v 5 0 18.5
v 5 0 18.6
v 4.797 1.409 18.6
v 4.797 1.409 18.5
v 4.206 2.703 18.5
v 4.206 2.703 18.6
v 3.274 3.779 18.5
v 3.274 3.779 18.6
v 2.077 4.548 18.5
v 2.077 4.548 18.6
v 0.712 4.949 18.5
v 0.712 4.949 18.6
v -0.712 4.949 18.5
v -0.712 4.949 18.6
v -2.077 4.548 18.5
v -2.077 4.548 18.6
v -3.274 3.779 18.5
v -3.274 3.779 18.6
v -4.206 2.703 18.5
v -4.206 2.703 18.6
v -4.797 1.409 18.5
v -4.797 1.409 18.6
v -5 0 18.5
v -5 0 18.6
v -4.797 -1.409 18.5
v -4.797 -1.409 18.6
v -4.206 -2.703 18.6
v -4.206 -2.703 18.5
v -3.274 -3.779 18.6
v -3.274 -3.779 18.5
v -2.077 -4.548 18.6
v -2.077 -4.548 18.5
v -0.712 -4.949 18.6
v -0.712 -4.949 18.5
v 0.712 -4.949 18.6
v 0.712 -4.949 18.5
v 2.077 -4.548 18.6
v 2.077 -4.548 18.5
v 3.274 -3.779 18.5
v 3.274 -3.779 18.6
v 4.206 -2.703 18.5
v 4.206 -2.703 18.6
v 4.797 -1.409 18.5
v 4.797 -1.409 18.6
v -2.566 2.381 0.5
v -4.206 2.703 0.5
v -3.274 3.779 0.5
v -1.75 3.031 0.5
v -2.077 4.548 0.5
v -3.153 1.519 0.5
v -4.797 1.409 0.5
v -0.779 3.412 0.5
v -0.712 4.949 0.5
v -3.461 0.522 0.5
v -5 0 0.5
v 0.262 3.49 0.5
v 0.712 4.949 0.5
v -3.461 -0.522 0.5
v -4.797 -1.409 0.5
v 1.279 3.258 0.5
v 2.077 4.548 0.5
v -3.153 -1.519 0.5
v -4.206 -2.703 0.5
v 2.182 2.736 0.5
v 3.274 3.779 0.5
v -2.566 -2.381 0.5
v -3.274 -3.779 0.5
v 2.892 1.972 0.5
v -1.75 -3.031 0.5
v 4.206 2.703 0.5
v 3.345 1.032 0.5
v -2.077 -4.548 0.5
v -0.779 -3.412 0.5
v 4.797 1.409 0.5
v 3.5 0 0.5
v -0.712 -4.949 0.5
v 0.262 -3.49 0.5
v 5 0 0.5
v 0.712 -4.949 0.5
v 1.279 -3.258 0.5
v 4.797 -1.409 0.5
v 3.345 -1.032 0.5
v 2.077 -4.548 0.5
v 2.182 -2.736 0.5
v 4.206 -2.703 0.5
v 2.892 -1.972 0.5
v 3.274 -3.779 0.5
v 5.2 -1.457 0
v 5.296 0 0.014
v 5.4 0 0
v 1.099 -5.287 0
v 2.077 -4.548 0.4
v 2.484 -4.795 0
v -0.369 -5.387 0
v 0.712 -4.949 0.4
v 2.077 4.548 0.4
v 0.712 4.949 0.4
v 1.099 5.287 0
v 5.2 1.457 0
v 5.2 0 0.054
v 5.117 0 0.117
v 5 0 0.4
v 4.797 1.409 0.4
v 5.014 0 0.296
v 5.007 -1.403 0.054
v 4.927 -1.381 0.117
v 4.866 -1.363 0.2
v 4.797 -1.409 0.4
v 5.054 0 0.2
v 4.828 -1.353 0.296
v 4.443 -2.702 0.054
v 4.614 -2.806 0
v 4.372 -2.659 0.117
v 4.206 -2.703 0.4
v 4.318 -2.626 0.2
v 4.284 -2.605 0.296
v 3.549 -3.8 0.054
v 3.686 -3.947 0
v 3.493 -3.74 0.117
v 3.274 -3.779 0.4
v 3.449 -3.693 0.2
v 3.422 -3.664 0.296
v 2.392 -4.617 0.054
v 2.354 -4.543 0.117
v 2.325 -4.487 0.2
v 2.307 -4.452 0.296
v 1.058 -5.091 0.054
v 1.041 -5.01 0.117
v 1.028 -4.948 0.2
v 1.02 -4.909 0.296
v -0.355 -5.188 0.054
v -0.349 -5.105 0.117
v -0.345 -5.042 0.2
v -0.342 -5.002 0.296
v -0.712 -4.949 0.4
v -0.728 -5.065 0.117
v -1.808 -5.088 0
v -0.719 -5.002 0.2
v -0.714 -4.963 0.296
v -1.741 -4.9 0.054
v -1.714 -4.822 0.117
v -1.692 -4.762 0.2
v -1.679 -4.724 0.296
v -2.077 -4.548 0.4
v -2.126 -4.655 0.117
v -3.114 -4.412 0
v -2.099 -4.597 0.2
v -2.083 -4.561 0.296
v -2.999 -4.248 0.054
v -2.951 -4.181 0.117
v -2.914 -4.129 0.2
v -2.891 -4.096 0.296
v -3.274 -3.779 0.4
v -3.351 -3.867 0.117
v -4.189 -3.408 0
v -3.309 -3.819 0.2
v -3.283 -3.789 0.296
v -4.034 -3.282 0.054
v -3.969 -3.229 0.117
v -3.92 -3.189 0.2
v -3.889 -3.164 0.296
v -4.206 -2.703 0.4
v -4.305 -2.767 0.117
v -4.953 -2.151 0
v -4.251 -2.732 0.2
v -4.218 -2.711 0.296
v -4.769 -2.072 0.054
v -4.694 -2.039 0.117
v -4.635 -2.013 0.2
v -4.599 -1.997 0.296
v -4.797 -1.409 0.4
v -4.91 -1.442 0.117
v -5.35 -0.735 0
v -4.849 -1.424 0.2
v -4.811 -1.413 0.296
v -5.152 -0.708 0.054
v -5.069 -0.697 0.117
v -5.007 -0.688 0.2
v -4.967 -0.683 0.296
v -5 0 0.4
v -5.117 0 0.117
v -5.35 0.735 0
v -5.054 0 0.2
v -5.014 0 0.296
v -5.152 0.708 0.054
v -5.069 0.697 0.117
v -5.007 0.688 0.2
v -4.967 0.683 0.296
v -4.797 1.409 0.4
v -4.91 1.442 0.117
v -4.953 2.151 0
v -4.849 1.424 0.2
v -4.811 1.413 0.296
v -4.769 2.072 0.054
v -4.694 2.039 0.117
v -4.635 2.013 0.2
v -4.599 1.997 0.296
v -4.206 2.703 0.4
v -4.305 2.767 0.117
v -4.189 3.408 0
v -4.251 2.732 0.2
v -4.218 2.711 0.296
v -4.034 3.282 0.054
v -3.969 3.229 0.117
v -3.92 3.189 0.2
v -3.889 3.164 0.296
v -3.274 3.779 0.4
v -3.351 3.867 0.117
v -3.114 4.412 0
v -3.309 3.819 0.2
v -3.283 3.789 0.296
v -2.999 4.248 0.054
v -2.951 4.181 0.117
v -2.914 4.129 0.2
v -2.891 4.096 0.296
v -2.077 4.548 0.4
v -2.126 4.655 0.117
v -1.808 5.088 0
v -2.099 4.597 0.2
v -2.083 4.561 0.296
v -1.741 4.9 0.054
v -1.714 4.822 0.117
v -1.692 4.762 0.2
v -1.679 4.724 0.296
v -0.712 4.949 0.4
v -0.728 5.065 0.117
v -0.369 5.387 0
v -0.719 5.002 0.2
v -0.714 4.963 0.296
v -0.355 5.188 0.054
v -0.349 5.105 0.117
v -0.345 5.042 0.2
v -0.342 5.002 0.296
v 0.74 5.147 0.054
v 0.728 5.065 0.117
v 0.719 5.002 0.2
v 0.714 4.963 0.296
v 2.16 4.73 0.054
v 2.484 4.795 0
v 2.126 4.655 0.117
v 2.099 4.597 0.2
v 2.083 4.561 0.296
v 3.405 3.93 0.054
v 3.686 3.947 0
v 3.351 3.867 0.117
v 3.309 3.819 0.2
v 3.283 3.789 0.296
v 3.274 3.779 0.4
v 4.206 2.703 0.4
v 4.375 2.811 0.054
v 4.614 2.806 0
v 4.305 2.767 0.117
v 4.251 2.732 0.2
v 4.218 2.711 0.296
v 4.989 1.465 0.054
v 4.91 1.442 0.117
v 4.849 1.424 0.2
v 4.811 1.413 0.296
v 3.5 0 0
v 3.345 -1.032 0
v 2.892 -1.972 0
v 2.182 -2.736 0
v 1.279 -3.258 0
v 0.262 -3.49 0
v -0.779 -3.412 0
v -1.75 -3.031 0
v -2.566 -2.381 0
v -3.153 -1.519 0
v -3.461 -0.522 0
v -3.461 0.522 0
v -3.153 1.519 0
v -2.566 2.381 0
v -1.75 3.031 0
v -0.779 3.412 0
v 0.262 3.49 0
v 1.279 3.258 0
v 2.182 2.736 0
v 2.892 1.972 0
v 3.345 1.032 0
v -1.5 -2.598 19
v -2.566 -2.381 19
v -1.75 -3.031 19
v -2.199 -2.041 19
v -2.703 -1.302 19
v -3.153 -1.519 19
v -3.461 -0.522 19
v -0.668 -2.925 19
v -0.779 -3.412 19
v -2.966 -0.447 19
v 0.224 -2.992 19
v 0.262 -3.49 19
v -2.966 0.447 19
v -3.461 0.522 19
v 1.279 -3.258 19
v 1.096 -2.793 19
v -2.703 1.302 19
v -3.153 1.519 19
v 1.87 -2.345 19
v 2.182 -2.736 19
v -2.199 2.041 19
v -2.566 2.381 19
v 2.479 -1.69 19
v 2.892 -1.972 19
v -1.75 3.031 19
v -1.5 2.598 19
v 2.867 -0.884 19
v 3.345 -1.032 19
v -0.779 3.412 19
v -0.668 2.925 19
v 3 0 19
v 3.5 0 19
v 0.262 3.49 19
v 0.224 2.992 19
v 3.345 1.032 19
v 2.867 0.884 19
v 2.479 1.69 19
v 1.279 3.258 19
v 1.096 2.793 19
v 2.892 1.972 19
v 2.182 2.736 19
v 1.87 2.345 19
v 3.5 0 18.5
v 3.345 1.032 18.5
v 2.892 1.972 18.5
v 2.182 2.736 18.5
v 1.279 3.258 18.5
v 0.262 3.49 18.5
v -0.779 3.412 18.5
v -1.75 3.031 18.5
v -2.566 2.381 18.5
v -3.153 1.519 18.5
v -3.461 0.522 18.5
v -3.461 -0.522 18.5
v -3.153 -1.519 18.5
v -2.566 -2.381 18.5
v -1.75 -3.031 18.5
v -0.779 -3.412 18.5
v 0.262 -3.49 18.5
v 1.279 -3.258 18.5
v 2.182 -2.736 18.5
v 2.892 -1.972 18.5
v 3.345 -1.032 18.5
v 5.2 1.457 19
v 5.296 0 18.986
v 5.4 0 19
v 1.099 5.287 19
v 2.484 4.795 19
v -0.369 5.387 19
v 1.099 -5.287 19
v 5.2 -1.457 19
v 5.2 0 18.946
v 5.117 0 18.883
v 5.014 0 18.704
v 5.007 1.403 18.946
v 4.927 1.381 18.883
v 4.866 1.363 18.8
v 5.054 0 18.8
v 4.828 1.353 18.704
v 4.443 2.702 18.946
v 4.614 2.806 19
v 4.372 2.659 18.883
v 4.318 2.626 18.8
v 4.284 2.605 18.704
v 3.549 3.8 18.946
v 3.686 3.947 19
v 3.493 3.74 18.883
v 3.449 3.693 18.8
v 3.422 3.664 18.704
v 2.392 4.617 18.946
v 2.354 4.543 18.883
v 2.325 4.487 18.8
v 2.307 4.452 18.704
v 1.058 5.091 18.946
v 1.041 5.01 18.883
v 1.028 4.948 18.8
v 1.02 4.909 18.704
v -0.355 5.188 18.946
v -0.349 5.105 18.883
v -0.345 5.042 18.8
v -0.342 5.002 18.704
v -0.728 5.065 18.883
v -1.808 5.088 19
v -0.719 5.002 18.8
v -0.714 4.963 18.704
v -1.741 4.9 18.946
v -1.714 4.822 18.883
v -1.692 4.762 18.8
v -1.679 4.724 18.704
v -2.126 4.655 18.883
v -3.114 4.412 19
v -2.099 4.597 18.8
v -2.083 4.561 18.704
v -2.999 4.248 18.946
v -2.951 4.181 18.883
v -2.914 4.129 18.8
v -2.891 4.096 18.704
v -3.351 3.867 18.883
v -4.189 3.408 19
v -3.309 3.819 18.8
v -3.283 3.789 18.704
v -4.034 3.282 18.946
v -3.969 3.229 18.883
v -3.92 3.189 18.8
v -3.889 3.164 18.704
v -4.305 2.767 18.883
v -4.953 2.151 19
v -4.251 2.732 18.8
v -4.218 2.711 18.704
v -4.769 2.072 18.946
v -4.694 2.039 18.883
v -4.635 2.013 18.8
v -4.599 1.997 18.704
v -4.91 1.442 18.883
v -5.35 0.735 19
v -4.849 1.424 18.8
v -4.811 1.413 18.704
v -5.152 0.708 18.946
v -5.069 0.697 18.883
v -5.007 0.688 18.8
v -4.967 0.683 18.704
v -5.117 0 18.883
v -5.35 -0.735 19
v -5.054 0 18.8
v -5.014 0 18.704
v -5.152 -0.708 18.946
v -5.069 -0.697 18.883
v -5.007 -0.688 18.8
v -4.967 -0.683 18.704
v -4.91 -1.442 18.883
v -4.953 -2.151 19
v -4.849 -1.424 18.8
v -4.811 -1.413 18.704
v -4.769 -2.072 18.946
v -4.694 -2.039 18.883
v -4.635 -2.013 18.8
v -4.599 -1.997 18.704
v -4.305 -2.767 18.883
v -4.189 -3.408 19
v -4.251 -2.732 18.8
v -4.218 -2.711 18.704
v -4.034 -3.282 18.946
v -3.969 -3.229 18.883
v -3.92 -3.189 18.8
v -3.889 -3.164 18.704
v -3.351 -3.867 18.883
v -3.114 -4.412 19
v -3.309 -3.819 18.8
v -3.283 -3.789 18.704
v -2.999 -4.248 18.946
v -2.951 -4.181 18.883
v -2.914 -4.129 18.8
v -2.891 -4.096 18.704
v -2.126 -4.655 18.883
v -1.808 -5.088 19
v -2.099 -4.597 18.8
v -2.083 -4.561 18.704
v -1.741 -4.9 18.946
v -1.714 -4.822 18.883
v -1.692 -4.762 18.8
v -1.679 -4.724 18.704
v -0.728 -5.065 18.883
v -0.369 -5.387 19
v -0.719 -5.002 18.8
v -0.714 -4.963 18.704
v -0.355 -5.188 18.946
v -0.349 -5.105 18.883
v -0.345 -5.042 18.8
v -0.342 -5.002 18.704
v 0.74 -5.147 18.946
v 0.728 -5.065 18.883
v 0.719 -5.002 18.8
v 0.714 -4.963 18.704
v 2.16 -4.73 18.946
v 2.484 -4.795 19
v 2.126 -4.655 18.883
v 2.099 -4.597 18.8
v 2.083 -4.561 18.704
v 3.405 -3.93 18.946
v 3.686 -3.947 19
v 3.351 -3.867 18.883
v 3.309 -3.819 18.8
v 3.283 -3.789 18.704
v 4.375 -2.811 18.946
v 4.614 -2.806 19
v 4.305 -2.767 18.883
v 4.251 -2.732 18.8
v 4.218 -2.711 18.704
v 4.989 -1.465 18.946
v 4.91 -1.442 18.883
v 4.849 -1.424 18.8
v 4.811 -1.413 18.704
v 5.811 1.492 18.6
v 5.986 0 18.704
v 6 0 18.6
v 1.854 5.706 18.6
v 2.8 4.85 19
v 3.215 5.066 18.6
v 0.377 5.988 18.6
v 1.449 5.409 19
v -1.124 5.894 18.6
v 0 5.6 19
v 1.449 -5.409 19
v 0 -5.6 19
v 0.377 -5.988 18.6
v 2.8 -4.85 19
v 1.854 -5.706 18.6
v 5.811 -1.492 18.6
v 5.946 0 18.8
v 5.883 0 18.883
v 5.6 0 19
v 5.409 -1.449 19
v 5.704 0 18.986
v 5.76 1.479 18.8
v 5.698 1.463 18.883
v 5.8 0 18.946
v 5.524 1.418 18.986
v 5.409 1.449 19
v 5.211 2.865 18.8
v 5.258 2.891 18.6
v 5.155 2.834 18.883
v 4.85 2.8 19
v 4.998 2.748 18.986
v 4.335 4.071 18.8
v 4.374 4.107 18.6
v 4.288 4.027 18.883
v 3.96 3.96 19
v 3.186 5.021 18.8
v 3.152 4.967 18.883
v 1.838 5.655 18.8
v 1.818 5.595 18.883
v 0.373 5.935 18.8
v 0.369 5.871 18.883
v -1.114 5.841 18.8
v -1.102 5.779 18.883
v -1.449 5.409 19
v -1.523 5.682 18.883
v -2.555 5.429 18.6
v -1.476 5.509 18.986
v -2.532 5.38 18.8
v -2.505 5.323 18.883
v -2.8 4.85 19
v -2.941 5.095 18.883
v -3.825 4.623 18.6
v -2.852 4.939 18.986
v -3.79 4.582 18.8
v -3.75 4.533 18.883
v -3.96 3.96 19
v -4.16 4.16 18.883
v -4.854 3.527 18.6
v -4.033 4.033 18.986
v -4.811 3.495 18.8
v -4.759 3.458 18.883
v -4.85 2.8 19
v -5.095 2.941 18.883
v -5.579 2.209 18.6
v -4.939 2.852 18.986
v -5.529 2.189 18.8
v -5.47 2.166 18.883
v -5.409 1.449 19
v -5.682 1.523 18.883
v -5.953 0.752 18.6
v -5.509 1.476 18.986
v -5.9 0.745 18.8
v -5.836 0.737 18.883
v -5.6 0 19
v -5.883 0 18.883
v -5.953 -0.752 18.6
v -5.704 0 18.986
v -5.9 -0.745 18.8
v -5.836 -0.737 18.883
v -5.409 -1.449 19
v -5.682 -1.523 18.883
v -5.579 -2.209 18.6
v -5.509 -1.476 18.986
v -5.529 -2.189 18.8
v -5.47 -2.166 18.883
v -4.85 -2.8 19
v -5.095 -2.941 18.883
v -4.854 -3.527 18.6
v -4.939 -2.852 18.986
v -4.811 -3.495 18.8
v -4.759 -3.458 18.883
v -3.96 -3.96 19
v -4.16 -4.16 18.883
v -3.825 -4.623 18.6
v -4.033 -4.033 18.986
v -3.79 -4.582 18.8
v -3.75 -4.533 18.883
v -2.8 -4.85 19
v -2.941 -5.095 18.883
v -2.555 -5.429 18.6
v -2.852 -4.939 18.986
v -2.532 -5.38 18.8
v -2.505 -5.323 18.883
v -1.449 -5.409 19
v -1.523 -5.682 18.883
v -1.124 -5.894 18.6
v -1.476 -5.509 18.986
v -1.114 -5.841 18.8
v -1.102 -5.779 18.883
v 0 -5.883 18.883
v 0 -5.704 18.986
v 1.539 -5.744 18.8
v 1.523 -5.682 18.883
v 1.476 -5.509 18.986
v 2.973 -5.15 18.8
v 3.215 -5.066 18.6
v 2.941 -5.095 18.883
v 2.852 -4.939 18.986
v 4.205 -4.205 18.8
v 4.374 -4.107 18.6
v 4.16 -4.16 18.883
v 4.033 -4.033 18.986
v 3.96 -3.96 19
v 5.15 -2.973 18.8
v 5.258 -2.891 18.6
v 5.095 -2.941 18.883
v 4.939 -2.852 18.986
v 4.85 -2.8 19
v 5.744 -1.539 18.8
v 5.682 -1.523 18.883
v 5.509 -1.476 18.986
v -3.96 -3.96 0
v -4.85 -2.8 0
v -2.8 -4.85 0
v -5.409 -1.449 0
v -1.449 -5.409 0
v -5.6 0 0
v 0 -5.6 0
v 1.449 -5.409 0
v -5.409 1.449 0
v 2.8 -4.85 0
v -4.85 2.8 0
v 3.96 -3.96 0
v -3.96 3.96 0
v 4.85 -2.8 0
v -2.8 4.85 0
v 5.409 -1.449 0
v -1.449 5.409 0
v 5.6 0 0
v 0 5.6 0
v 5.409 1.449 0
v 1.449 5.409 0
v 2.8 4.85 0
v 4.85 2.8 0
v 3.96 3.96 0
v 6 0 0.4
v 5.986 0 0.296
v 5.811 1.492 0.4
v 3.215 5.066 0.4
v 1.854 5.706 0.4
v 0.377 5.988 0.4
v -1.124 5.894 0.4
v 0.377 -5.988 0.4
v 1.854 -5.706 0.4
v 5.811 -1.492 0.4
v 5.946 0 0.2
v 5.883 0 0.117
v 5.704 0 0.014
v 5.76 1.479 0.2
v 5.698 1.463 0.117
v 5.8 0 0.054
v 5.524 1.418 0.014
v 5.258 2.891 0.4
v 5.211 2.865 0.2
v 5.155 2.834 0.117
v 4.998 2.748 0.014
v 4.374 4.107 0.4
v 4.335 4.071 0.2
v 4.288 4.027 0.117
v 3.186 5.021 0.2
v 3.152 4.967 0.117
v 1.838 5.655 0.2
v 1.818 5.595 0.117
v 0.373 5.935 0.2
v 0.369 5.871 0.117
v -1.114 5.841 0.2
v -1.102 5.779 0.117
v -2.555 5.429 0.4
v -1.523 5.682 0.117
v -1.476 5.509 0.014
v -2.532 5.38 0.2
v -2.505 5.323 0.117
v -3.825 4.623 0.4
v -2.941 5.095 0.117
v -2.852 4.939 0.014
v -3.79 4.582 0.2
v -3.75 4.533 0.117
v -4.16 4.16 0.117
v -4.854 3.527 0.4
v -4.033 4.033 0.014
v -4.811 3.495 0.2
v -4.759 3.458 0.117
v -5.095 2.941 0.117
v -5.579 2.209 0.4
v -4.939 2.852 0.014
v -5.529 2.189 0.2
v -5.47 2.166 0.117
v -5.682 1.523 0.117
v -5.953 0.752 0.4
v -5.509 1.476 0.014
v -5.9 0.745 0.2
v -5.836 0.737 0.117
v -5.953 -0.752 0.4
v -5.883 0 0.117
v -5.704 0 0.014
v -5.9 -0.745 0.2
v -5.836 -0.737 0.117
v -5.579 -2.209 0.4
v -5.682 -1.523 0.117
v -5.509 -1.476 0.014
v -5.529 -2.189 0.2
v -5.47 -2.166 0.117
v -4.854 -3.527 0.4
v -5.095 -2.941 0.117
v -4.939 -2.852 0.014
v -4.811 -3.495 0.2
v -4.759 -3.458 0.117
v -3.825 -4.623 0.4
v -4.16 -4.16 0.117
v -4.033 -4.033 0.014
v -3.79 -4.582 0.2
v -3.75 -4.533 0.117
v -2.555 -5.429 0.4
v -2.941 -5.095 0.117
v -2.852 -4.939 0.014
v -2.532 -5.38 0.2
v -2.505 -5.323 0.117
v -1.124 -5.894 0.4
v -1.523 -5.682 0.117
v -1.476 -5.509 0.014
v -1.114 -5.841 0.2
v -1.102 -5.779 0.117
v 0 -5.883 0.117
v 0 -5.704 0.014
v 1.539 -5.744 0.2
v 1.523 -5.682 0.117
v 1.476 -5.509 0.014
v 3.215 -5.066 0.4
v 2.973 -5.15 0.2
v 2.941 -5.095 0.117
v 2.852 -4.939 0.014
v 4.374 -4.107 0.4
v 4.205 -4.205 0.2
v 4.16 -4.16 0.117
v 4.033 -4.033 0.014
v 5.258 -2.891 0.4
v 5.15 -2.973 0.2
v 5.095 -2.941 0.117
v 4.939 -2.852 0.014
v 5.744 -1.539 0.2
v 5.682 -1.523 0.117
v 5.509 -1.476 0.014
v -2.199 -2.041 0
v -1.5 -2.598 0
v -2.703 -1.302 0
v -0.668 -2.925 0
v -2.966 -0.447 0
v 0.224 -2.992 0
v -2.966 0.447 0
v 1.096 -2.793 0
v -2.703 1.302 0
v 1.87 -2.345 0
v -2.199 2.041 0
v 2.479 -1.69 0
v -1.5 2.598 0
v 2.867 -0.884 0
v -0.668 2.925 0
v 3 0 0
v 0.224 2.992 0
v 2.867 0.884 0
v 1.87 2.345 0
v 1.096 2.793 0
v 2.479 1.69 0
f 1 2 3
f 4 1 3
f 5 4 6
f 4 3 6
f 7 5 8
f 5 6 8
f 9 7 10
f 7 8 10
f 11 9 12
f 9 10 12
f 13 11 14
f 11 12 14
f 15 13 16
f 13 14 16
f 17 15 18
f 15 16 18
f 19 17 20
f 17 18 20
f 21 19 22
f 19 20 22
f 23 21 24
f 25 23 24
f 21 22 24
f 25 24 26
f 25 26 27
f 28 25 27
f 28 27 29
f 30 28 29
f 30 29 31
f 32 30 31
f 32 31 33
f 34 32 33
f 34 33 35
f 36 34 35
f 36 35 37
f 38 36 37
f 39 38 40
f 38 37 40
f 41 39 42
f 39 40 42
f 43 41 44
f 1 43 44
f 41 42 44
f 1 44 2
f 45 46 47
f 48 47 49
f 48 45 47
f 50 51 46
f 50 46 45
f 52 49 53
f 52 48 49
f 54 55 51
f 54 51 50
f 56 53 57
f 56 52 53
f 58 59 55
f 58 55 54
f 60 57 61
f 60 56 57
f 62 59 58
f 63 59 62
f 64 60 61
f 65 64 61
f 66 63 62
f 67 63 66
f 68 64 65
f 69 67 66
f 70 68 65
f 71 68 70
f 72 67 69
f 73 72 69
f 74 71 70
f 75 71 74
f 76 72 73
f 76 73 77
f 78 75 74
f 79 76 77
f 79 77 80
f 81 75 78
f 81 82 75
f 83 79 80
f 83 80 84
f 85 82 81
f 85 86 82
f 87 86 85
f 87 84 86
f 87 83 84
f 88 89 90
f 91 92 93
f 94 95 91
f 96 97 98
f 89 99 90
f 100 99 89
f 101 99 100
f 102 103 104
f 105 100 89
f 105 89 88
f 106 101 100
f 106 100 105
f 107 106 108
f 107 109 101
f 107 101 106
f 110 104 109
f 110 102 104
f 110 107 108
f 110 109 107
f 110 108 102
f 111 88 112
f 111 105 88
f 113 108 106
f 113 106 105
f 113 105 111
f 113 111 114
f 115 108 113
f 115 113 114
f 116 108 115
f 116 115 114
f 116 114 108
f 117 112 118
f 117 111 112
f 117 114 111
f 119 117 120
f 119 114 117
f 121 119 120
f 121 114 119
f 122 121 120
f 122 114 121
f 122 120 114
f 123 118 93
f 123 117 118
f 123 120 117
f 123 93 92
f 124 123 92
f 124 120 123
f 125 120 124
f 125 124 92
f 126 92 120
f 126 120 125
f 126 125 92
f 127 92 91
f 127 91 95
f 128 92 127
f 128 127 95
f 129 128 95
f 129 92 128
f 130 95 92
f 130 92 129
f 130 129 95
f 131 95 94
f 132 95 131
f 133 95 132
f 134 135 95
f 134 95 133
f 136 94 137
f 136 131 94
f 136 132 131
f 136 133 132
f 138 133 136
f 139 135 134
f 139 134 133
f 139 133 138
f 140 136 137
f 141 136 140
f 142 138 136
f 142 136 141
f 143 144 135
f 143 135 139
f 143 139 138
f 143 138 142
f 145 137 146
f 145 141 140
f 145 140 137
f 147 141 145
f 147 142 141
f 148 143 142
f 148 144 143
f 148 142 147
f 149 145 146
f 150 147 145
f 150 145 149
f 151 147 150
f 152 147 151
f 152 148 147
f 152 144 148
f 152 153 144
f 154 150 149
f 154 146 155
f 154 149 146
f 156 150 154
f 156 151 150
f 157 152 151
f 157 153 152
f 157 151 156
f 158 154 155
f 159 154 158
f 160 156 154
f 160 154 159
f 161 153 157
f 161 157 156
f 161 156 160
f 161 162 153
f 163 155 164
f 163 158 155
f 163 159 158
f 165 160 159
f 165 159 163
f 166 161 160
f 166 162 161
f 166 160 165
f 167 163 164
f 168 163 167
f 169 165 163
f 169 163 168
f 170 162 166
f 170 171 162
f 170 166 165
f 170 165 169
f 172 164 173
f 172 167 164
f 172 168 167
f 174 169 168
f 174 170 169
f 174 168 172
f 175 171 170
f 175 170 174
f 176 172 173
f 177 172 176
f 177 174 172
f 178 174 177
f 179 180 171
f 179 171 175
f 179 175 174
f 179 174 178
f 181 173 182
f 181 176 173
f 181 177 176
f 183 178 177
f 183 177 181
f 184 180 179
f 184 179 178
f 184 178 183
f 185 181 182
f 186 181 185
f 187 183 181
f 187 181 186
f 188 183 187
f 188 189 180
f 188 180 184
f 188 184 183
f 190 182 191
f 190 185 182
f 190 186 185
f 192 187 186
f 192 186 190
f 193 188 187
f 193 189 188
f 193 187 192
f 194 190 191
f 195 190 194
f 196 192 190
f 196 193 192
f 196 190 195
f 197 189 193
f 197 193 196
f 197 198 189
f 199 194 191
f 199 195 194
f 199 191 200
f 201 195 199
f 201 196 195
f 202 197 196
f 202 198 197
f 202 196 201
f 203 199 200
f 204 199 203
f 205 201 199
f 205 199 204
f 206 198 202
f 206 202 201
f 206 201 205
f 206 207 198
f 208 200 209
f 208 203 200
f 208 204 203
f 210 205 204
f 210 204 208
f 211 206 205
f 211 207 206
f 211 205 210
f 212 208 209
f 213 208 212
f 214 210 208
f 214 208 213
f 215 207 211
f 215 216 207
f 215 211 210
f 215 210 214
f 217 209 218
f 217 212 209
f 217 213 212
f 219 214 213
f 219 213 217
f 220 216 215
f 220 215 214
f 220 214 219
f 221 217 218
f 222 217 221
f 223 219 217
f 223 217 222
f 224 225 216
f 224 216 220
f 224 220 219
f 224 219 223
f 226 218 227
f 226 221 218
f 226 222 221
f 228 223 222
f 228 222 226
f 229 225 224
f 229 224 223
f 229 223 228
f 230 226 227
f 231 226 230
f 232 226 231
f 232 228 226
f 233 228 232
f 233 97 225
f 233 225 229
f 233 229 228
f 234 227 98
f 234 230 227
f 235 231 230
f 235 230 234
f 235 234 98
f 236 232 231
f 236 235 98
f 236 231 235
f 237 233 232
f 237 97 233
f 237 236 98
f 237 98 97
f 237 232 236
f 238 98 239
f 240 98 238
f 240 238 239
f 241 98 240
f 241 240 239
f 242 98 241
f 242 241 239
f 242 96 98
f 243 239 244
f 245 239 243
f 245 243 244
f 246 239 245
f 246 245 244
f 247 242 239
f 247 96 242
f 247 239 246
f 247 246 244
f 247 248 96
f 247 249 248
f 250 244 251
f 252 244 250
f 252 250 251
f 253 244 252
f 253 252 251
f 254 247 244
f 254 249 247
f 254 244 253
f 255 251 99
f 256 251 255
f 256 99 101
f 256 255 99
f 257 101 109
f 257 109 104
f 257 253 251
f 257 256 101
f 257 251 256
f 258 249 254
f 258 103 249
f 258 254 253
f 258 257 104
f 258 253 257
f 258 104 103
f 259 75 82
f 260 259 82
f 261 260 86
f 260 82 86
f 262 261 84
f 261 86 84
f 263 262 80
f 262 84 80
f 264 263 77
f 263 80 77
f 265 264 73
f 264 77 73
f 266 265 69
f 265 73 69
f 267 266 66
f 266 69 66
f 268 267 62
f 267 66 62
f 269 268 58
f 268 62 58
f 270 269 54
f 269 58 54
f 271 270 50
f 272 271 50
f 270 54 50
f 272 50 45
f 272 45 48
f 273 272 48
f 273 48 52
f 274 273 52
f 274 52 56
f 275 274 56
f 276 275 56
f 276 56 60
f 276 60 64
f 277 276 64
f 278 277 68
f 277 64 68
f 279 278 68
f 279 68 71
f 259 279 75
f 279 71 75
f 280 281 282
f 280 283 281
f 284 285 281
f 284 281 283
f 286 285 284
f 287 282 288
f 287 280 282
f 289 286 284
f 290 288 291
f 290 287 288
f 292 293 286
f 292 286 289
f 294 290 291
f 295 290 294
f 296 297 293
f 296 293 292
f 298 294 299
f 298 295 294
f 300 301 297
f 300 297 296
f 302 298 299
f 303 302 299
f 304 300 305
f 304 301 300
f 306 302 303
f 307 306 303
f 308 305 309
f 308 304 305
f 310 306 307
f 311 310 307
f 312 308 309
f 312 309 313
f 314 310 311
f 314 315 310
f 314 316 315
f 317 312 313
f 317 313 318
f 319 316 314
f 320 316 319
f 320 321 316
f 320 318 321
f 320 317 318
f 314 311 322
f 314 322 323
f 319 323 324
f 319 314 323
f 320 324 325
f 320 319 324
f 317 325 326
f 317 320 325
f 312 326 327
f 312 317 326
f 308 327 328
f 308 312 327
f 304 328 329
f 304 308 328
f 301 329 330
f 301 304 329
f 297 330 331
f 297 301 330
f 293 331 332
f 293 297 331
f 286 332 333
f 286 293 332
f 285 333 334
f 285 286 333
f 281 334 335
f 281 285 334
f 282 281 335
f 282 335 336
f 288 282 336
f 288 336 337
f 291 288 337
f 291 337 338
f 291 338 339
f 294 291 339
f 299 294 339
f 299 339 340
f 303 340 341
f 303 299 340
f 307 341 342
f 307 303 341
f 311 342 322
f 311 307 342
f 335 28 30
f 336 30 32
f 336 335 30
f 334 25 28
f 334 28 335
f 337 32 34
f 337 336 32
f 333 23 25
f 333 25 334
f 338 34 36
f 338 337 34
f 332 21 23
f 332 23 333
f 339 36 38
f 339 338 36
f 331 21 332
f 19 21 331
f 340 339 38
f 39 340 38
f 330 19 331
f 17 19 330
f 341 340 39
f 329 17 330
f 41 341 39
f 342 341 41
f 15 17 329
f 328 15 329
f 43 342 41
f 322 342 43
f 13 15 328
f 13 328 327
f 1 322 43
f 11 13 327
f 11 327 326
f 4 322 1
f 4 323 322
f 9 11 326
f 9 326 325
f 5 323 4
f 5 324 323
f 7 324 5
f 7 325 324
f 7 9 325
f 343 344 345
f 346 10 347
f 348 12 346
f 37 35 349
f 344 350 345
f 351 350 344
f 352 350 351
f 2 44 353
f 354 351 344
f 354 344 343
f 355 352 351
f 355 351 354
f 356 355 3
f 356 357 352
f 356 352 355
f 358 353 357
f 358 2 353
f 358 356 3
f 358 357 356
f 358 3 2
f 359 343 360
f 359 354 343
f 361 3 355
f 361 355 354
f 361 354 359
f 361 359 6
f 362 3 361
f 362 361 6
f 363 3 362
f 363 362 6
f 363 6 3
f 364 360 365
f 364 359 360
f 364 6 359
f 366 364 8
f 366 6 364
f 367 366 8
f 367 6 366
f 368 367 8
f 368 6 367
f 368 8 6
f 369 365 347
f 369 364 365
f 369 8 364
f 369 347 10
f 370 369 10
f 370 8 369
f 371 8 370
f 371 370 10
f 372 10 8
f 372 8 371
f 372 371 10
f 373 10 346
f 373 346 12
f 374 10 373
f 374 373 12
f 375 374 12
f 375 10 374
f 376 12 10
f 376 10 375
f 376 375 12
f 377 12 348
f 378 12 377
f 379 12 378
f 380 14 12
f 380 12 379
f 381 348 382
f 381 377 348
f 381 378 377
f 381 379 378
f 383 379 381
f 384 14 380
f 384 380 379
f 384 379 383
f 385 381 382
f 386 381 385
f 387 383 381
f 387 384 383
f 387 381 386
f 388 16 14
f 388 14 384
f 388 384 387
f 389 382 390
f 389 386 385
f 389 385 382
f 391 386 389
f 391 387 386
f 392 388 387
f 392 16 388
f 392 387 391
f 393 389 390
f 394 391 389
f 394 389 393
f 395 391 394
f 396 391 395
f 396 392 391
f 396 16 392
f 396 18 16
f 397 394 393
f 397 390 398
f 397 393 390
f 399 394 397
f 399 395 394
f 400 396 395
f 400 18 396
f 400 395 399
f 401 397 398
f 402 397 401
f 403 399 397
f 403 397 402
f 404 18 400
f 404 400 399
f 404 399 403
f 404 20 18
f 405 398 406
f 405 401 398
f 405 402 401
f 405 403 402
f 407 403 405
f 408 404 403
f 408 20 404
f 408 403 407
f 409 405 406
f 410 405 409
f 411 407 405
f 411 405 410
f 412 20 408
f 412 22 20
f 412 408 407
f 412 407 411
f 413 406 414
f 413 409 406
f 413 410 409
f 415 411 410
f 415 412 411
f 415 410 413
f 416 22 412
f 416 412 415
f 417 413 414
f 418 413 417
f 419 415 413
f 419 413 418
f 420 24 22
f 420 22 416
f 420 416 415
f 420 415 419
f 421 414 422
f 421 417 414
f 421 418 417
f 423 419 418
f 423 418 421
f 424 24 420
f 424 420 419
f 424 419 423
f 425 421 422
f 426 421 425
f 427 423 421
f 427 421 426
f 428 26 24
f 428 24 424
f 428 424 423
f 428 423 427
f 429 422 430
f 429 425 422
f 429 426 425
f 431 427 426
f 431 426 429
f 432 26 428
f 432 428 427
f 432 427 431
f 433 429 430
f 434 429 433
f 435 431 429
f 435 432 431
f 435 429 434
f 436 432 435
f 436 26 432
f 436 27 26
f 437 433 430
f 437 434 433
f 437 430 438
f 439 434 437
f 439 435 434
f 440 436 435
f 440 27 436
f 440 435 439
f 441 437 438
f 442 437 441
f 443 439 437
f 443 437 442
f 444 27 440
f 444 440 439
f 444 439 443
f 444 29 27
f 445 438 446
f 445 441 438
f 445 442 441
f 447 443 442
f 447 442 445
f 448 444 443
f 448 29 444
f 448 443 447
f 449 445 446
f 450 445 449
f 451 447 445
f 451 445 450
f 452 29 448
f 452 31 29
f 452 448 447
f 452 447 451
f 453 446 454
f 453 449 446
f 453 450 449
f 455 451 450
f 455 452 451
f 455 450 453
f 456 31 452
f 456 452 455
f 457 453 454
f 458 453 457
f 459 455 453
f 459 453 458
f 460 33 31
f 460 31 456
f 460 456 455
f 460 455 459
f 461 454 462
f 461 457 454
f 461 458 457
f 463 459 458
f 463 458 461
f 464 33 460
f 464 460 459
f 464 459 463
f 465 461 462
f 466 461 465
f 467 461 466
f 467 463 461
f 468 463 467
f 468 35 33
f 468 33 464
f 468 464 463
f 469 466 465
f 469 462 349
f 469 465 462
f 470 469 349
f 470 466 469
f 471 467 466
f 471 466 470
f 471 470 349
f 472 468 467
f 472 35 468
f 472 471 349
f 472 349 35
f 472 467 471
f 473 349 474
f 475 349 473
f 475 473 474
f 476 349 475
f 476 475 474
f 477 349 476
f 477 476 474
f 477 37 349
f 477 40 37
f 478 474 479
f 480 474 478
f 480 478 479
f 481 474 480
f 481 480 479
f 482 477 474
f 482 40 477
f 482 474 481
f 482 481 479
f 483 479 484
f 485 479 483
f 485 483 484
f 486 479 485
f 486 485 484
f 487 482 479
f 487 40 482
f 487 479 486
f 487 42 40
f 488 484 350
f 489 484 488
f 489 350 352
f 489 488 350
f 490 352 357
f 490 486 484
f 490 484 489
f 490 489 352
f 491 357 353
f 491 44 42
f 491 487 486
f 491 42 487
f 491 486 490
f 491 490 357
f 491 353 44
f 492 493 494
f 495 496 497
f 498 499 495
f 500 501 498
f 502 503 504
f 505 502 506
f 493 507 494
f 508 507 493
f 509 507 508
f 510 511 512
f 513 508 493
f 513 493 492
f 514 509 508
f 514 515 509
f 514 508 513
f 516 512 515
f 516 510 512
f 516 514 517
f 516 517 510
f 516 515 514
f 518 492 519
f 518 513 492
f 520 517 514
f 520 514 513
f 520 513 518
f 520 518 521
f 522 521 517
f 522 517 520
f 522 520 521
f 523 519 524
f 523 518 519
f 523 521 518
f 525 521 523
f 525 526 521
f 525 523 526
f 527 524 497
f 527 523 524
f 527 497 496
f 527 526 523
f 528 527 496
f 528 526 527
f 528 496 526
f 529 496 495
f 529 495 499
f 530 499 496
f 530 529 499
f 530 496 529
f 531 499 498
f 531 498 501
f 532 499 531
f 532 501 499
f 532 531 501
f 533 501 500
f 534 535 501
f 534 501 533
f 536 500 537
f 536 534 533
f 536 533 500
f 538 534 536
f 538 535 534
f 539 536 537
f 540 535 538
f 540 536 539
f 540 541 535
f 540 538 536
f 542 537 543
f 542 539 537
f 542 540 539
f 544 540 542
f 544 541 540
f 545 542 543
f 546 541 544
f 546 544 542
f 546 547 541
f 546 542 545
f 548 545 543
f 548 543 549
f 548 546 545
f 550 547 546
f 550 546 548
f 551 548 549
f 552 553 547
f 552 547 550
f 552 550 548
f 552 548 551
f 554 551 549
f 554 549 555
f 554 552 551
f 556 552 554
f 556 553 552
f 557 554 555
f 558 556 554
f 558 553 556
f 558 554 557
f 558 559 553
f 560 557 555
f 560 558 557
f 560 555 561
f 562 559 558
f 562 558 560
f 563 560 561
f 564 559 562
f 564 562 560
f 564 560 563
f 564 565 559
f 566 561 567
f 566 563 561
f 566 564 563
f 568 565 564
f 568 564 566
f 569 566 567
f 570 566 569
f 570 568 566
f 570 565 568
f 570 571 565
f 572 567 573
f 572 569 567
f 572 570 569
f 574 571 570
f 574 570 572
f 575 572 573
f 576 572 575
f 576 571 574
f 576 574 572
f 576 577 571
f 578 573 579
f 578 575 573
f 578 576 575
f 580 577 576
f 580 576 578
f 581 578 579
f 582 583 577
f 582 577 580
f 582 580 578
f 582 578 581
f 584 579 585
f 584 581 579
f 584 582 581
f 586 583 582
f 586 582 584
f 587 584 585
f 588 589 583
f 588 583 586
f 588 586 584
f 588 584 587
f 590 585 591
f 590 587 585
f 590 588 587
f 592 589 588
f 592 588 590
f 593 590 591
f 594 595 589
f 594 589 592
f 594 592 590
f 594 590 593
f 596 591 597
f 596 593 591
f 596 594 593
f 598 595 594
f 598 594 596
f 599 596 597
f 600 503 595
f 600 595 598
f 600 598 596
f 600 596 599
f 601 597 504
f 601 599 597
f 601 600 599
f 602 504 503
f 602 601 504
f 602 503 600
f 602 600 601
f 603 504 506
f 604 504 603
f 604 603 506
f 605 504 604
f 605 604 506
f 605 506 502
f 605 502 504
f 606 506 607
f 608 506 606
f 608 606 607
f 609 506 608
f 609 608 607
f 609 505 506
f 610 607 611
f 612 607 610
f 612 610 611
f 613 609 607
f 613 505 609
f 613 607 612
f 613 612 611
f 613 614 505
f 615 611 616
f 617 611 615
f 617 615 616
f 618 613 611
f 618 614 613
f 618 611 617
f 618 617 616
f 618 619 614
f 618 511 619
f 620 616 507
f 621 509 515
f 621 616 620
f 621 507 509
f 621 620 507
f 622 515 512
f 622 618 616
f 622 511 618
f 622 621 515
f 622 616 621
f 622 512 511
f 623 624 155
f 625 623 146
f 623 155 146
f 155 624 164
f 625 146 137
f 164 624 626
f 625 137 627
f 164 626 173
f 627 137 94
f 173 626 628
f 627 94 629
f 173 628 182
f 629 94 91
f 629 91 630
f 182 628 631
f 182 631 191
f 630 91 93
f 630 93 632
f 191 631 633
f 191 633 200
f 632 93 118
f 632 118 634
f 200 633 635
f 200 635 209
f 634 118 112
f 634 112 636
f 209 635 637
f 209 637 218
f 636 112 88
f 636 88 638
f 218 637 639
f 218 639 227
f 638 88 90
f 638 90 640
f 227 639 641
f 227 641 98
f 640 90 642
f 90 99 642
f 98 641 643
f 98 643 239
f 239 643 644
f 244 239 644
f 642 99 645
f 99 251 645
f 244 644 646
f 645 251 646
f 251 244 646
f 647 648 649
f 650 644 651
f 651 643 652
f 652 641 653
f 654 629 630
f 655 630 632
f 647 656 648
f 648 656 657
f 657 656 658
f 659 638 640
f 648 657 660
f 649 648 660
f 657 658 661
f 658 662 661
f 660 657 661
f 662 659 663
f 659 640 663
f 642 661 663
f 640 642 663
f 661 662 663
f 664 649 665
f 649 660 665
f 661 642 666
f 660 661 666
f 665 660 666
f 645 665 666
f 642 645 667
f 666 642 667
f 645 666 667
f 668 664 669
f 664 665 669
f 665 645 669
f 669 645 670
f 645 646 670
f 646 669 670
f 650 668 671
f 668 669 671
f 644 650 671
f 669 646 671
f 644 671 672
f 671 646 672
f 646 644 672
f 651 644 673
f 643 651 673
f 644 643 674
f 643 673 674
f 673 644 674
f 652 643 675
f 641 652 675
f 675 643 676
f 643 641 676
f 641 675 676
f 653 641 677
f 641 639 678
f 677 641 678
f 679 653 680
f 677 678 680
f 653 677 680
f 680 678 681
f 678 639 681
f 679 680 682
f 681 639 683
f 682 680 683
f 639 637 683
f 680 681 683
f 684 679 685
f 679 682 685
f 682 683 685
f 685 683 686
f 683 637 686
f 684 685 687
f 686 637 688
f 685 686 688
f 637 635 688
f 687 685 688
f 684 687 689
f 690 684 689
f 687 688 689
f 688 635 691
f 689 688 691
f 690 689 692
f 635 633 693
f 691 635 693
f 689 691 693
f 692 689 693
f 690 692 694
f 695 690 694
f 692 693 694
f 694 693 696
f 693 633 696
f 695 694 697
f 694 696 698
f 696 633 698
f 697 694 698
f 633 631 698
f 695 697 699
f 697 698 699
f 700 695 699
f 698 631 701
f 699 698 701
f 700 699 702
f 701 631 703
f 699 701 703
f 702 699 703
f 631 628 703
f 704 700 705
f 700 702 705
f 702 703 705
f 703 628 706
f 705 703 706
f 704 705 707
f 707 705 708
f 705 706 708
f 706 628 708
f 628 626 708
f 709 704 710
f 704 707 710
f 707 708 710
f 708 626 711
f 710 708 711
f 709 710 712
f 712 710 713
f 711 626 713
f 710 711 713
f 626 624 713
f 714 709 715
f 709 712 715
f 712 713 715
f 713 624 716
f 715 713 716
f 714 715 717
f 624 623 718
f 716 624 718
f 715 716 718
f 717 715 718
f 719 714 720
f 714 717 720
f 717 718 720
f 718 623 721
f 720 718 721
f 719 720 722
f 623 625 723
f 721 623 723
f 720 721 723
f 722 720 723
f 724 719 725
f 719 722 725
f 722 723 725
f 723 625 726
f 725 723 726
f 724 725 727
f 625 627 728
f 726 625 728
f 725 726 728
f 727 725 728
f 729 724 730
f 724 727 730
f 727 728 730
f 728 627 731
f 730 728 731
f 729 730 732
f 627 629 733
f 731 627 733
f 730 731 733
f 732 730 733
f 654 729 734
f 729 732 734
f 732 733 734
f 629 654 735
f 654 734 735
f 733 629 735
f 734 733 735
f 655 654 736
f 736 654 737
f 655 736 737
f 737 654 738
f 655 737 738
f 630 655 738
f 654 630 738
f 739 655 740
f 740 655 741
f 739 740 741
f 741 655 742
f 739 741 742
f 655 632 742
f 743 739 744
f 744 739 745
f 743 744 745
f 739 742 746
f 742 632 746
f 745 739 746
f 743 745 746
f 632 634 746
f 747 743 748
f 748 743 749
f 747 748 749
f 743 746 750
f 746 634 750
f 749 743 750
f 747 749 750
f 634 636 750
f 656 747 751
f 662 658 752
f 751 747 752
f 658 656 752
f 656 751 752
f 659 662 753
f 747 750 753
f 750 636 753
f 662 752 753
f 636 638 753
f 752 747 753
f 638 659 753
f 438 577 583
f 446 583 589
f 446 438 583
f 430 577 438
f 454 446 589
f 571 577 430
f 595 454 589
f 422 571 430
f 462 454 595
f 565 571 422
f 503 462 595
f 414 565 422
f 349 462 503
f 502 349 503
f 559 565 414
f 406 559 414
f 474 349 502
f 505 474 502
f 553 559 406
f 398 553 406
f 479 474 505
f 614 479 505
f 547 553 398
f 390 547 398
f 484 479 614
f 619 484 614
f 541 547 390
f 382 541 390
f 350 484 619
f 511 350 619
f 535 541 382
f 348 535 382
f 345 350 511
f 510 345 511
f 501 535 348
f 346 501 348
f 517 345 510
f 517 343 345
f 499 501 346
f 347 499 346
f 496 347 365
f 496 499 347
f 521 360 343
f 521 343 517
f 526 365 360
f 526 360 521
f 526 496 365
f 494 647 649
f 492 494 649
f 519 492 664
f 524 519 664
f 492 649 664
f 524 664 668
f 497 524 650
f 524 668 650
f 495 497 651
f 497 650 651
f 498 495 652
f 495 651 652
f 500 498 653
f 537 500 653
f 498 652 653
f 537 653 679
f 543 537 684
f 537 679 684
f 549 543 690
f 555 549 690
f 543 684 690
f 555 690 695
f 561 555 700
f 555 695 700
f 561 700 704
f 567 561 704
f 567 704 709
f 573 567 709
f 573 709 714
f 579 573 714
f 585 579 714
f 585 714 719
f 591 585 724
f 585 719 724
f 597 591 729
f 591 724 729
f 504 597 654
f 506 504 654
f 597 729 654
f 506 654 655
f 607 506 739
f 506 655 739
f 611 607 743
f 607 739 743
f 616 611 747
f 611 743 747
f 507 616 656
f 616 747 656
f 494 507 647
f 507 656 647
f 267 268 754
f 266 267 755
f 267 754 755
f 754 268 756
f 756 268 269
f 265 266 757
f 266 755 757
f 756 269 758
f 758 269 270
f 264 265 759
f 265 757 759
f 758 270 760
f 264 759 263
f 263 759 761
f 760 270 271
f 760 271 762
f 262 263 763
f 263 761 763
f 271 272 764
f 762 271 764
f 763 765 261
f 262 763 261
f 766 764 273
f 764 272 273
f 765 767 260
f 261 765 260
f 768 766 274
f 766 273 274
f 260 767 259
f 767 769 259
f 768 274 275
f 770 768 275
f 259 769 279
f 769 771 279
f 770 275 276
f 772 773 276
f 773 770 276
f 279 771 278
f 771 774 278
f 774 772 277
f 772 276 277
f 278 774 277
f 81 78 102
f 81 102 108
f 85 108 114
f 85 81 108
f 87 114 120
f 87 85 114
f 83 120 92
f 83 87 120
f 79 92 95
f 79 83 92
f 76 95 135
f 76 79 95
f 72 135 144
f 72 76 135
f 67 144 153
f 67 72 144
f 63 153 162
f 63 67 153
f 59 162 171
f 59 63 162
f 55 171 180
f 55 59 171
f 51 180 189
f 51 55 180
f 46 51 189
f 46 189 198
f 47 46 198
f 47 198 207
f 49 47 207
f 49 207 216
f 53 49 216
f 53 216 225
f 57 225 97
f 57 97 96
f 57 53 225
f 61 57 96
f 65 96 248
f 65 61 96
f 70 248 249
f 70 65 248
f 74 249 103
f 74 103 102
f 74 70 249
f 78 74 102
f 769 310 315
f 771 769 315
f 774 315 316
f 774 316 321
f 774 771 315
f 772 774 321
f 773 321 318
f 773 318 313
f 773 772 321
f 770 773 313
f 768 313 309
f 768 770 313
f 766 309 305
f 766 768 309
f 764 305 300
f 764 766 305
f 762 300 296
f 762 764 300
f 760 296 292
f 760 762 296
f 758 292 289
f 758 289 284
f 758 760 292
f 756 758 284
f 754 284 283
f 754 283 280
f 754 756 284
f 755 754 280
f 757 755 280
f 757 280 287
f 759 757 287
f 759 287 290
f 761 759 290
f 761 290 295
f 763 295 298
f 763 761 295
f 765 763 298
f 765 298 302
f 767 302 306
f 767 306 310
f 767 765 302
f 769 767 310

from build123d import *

# Parameters (mm, degrees)
SKETCH_2_R          = 6
SKETCH_2_R_2        = 3
EXTRUDE_1_DEPTH     = 19
SKETCH_3_R          = 5
SKETCH_3_R_2        = 3.5
CUT_EXTRUDE_1_DEPTH = 0.5
CUT_EXTRUDE_START   = -0.5
SKETCH_4_R          = 5
SKETCH_4_R_2        = 3.5
CUT_EXTRUDE_2_DEPTH = 0.5
FILLET_1_R          = 0.4


with BuildPart() as part:
    # 草图2 → 凸台-拉伸1 (new body)
    with BuildSketch(Plane.XY):
        Circle(SKETCH_2_R)
        Circle(SKETCH_2_R_2, mode=Mode.SUBTRACT)
    extrude(amount=EXTRUDE_1_DEPTH)

    # 草图3 → 切除-拉伸1 (cut)
    with BuildSketch(Plane.XY.offset(19)):
        Circle(SKETCH_3_R)
        Circle(SKETCH_3_R_2, mode=Mode.SUBTRACT)
    extrude(amount=-CUT_EXTRUDE_1_DEPTH, mode=Mode.SUBTRACT)

    # 草图4 → 切除-拉伸2 (cut)
    with BuildSketch(Plane(origin=(0, 0, 0), x_dir=(-1, 0, 0), z_dir=(0, 0, -1)).offset(CUT_EXTRUDE_START)):
        with Locations(Location((0, 0, 0), (0, 0, 180))):
            Circle(SKETCH_4_R)
        with Locations(Location((0, 0, 0), (0, 0, 180))):
            Circle(SKETCH_4_R_2, mode=Mode.SUBTRACT)
    extrude(amount=CUT_EXTRUDE_2_DEPTH, mode=Mode.SUBTRACT)

    # 圆角1
    fillet_1_edges = [part.edges().sort_by_distance(p)[0] for p in [
        (-5, 0, 19),
        (-6, 0, 0),
        (-5, 0, 0),
        (-6, 0, 19),
    ]]
    fillet(fillet_1_edges, radius=FILLET_1_R)


solid = part.part
